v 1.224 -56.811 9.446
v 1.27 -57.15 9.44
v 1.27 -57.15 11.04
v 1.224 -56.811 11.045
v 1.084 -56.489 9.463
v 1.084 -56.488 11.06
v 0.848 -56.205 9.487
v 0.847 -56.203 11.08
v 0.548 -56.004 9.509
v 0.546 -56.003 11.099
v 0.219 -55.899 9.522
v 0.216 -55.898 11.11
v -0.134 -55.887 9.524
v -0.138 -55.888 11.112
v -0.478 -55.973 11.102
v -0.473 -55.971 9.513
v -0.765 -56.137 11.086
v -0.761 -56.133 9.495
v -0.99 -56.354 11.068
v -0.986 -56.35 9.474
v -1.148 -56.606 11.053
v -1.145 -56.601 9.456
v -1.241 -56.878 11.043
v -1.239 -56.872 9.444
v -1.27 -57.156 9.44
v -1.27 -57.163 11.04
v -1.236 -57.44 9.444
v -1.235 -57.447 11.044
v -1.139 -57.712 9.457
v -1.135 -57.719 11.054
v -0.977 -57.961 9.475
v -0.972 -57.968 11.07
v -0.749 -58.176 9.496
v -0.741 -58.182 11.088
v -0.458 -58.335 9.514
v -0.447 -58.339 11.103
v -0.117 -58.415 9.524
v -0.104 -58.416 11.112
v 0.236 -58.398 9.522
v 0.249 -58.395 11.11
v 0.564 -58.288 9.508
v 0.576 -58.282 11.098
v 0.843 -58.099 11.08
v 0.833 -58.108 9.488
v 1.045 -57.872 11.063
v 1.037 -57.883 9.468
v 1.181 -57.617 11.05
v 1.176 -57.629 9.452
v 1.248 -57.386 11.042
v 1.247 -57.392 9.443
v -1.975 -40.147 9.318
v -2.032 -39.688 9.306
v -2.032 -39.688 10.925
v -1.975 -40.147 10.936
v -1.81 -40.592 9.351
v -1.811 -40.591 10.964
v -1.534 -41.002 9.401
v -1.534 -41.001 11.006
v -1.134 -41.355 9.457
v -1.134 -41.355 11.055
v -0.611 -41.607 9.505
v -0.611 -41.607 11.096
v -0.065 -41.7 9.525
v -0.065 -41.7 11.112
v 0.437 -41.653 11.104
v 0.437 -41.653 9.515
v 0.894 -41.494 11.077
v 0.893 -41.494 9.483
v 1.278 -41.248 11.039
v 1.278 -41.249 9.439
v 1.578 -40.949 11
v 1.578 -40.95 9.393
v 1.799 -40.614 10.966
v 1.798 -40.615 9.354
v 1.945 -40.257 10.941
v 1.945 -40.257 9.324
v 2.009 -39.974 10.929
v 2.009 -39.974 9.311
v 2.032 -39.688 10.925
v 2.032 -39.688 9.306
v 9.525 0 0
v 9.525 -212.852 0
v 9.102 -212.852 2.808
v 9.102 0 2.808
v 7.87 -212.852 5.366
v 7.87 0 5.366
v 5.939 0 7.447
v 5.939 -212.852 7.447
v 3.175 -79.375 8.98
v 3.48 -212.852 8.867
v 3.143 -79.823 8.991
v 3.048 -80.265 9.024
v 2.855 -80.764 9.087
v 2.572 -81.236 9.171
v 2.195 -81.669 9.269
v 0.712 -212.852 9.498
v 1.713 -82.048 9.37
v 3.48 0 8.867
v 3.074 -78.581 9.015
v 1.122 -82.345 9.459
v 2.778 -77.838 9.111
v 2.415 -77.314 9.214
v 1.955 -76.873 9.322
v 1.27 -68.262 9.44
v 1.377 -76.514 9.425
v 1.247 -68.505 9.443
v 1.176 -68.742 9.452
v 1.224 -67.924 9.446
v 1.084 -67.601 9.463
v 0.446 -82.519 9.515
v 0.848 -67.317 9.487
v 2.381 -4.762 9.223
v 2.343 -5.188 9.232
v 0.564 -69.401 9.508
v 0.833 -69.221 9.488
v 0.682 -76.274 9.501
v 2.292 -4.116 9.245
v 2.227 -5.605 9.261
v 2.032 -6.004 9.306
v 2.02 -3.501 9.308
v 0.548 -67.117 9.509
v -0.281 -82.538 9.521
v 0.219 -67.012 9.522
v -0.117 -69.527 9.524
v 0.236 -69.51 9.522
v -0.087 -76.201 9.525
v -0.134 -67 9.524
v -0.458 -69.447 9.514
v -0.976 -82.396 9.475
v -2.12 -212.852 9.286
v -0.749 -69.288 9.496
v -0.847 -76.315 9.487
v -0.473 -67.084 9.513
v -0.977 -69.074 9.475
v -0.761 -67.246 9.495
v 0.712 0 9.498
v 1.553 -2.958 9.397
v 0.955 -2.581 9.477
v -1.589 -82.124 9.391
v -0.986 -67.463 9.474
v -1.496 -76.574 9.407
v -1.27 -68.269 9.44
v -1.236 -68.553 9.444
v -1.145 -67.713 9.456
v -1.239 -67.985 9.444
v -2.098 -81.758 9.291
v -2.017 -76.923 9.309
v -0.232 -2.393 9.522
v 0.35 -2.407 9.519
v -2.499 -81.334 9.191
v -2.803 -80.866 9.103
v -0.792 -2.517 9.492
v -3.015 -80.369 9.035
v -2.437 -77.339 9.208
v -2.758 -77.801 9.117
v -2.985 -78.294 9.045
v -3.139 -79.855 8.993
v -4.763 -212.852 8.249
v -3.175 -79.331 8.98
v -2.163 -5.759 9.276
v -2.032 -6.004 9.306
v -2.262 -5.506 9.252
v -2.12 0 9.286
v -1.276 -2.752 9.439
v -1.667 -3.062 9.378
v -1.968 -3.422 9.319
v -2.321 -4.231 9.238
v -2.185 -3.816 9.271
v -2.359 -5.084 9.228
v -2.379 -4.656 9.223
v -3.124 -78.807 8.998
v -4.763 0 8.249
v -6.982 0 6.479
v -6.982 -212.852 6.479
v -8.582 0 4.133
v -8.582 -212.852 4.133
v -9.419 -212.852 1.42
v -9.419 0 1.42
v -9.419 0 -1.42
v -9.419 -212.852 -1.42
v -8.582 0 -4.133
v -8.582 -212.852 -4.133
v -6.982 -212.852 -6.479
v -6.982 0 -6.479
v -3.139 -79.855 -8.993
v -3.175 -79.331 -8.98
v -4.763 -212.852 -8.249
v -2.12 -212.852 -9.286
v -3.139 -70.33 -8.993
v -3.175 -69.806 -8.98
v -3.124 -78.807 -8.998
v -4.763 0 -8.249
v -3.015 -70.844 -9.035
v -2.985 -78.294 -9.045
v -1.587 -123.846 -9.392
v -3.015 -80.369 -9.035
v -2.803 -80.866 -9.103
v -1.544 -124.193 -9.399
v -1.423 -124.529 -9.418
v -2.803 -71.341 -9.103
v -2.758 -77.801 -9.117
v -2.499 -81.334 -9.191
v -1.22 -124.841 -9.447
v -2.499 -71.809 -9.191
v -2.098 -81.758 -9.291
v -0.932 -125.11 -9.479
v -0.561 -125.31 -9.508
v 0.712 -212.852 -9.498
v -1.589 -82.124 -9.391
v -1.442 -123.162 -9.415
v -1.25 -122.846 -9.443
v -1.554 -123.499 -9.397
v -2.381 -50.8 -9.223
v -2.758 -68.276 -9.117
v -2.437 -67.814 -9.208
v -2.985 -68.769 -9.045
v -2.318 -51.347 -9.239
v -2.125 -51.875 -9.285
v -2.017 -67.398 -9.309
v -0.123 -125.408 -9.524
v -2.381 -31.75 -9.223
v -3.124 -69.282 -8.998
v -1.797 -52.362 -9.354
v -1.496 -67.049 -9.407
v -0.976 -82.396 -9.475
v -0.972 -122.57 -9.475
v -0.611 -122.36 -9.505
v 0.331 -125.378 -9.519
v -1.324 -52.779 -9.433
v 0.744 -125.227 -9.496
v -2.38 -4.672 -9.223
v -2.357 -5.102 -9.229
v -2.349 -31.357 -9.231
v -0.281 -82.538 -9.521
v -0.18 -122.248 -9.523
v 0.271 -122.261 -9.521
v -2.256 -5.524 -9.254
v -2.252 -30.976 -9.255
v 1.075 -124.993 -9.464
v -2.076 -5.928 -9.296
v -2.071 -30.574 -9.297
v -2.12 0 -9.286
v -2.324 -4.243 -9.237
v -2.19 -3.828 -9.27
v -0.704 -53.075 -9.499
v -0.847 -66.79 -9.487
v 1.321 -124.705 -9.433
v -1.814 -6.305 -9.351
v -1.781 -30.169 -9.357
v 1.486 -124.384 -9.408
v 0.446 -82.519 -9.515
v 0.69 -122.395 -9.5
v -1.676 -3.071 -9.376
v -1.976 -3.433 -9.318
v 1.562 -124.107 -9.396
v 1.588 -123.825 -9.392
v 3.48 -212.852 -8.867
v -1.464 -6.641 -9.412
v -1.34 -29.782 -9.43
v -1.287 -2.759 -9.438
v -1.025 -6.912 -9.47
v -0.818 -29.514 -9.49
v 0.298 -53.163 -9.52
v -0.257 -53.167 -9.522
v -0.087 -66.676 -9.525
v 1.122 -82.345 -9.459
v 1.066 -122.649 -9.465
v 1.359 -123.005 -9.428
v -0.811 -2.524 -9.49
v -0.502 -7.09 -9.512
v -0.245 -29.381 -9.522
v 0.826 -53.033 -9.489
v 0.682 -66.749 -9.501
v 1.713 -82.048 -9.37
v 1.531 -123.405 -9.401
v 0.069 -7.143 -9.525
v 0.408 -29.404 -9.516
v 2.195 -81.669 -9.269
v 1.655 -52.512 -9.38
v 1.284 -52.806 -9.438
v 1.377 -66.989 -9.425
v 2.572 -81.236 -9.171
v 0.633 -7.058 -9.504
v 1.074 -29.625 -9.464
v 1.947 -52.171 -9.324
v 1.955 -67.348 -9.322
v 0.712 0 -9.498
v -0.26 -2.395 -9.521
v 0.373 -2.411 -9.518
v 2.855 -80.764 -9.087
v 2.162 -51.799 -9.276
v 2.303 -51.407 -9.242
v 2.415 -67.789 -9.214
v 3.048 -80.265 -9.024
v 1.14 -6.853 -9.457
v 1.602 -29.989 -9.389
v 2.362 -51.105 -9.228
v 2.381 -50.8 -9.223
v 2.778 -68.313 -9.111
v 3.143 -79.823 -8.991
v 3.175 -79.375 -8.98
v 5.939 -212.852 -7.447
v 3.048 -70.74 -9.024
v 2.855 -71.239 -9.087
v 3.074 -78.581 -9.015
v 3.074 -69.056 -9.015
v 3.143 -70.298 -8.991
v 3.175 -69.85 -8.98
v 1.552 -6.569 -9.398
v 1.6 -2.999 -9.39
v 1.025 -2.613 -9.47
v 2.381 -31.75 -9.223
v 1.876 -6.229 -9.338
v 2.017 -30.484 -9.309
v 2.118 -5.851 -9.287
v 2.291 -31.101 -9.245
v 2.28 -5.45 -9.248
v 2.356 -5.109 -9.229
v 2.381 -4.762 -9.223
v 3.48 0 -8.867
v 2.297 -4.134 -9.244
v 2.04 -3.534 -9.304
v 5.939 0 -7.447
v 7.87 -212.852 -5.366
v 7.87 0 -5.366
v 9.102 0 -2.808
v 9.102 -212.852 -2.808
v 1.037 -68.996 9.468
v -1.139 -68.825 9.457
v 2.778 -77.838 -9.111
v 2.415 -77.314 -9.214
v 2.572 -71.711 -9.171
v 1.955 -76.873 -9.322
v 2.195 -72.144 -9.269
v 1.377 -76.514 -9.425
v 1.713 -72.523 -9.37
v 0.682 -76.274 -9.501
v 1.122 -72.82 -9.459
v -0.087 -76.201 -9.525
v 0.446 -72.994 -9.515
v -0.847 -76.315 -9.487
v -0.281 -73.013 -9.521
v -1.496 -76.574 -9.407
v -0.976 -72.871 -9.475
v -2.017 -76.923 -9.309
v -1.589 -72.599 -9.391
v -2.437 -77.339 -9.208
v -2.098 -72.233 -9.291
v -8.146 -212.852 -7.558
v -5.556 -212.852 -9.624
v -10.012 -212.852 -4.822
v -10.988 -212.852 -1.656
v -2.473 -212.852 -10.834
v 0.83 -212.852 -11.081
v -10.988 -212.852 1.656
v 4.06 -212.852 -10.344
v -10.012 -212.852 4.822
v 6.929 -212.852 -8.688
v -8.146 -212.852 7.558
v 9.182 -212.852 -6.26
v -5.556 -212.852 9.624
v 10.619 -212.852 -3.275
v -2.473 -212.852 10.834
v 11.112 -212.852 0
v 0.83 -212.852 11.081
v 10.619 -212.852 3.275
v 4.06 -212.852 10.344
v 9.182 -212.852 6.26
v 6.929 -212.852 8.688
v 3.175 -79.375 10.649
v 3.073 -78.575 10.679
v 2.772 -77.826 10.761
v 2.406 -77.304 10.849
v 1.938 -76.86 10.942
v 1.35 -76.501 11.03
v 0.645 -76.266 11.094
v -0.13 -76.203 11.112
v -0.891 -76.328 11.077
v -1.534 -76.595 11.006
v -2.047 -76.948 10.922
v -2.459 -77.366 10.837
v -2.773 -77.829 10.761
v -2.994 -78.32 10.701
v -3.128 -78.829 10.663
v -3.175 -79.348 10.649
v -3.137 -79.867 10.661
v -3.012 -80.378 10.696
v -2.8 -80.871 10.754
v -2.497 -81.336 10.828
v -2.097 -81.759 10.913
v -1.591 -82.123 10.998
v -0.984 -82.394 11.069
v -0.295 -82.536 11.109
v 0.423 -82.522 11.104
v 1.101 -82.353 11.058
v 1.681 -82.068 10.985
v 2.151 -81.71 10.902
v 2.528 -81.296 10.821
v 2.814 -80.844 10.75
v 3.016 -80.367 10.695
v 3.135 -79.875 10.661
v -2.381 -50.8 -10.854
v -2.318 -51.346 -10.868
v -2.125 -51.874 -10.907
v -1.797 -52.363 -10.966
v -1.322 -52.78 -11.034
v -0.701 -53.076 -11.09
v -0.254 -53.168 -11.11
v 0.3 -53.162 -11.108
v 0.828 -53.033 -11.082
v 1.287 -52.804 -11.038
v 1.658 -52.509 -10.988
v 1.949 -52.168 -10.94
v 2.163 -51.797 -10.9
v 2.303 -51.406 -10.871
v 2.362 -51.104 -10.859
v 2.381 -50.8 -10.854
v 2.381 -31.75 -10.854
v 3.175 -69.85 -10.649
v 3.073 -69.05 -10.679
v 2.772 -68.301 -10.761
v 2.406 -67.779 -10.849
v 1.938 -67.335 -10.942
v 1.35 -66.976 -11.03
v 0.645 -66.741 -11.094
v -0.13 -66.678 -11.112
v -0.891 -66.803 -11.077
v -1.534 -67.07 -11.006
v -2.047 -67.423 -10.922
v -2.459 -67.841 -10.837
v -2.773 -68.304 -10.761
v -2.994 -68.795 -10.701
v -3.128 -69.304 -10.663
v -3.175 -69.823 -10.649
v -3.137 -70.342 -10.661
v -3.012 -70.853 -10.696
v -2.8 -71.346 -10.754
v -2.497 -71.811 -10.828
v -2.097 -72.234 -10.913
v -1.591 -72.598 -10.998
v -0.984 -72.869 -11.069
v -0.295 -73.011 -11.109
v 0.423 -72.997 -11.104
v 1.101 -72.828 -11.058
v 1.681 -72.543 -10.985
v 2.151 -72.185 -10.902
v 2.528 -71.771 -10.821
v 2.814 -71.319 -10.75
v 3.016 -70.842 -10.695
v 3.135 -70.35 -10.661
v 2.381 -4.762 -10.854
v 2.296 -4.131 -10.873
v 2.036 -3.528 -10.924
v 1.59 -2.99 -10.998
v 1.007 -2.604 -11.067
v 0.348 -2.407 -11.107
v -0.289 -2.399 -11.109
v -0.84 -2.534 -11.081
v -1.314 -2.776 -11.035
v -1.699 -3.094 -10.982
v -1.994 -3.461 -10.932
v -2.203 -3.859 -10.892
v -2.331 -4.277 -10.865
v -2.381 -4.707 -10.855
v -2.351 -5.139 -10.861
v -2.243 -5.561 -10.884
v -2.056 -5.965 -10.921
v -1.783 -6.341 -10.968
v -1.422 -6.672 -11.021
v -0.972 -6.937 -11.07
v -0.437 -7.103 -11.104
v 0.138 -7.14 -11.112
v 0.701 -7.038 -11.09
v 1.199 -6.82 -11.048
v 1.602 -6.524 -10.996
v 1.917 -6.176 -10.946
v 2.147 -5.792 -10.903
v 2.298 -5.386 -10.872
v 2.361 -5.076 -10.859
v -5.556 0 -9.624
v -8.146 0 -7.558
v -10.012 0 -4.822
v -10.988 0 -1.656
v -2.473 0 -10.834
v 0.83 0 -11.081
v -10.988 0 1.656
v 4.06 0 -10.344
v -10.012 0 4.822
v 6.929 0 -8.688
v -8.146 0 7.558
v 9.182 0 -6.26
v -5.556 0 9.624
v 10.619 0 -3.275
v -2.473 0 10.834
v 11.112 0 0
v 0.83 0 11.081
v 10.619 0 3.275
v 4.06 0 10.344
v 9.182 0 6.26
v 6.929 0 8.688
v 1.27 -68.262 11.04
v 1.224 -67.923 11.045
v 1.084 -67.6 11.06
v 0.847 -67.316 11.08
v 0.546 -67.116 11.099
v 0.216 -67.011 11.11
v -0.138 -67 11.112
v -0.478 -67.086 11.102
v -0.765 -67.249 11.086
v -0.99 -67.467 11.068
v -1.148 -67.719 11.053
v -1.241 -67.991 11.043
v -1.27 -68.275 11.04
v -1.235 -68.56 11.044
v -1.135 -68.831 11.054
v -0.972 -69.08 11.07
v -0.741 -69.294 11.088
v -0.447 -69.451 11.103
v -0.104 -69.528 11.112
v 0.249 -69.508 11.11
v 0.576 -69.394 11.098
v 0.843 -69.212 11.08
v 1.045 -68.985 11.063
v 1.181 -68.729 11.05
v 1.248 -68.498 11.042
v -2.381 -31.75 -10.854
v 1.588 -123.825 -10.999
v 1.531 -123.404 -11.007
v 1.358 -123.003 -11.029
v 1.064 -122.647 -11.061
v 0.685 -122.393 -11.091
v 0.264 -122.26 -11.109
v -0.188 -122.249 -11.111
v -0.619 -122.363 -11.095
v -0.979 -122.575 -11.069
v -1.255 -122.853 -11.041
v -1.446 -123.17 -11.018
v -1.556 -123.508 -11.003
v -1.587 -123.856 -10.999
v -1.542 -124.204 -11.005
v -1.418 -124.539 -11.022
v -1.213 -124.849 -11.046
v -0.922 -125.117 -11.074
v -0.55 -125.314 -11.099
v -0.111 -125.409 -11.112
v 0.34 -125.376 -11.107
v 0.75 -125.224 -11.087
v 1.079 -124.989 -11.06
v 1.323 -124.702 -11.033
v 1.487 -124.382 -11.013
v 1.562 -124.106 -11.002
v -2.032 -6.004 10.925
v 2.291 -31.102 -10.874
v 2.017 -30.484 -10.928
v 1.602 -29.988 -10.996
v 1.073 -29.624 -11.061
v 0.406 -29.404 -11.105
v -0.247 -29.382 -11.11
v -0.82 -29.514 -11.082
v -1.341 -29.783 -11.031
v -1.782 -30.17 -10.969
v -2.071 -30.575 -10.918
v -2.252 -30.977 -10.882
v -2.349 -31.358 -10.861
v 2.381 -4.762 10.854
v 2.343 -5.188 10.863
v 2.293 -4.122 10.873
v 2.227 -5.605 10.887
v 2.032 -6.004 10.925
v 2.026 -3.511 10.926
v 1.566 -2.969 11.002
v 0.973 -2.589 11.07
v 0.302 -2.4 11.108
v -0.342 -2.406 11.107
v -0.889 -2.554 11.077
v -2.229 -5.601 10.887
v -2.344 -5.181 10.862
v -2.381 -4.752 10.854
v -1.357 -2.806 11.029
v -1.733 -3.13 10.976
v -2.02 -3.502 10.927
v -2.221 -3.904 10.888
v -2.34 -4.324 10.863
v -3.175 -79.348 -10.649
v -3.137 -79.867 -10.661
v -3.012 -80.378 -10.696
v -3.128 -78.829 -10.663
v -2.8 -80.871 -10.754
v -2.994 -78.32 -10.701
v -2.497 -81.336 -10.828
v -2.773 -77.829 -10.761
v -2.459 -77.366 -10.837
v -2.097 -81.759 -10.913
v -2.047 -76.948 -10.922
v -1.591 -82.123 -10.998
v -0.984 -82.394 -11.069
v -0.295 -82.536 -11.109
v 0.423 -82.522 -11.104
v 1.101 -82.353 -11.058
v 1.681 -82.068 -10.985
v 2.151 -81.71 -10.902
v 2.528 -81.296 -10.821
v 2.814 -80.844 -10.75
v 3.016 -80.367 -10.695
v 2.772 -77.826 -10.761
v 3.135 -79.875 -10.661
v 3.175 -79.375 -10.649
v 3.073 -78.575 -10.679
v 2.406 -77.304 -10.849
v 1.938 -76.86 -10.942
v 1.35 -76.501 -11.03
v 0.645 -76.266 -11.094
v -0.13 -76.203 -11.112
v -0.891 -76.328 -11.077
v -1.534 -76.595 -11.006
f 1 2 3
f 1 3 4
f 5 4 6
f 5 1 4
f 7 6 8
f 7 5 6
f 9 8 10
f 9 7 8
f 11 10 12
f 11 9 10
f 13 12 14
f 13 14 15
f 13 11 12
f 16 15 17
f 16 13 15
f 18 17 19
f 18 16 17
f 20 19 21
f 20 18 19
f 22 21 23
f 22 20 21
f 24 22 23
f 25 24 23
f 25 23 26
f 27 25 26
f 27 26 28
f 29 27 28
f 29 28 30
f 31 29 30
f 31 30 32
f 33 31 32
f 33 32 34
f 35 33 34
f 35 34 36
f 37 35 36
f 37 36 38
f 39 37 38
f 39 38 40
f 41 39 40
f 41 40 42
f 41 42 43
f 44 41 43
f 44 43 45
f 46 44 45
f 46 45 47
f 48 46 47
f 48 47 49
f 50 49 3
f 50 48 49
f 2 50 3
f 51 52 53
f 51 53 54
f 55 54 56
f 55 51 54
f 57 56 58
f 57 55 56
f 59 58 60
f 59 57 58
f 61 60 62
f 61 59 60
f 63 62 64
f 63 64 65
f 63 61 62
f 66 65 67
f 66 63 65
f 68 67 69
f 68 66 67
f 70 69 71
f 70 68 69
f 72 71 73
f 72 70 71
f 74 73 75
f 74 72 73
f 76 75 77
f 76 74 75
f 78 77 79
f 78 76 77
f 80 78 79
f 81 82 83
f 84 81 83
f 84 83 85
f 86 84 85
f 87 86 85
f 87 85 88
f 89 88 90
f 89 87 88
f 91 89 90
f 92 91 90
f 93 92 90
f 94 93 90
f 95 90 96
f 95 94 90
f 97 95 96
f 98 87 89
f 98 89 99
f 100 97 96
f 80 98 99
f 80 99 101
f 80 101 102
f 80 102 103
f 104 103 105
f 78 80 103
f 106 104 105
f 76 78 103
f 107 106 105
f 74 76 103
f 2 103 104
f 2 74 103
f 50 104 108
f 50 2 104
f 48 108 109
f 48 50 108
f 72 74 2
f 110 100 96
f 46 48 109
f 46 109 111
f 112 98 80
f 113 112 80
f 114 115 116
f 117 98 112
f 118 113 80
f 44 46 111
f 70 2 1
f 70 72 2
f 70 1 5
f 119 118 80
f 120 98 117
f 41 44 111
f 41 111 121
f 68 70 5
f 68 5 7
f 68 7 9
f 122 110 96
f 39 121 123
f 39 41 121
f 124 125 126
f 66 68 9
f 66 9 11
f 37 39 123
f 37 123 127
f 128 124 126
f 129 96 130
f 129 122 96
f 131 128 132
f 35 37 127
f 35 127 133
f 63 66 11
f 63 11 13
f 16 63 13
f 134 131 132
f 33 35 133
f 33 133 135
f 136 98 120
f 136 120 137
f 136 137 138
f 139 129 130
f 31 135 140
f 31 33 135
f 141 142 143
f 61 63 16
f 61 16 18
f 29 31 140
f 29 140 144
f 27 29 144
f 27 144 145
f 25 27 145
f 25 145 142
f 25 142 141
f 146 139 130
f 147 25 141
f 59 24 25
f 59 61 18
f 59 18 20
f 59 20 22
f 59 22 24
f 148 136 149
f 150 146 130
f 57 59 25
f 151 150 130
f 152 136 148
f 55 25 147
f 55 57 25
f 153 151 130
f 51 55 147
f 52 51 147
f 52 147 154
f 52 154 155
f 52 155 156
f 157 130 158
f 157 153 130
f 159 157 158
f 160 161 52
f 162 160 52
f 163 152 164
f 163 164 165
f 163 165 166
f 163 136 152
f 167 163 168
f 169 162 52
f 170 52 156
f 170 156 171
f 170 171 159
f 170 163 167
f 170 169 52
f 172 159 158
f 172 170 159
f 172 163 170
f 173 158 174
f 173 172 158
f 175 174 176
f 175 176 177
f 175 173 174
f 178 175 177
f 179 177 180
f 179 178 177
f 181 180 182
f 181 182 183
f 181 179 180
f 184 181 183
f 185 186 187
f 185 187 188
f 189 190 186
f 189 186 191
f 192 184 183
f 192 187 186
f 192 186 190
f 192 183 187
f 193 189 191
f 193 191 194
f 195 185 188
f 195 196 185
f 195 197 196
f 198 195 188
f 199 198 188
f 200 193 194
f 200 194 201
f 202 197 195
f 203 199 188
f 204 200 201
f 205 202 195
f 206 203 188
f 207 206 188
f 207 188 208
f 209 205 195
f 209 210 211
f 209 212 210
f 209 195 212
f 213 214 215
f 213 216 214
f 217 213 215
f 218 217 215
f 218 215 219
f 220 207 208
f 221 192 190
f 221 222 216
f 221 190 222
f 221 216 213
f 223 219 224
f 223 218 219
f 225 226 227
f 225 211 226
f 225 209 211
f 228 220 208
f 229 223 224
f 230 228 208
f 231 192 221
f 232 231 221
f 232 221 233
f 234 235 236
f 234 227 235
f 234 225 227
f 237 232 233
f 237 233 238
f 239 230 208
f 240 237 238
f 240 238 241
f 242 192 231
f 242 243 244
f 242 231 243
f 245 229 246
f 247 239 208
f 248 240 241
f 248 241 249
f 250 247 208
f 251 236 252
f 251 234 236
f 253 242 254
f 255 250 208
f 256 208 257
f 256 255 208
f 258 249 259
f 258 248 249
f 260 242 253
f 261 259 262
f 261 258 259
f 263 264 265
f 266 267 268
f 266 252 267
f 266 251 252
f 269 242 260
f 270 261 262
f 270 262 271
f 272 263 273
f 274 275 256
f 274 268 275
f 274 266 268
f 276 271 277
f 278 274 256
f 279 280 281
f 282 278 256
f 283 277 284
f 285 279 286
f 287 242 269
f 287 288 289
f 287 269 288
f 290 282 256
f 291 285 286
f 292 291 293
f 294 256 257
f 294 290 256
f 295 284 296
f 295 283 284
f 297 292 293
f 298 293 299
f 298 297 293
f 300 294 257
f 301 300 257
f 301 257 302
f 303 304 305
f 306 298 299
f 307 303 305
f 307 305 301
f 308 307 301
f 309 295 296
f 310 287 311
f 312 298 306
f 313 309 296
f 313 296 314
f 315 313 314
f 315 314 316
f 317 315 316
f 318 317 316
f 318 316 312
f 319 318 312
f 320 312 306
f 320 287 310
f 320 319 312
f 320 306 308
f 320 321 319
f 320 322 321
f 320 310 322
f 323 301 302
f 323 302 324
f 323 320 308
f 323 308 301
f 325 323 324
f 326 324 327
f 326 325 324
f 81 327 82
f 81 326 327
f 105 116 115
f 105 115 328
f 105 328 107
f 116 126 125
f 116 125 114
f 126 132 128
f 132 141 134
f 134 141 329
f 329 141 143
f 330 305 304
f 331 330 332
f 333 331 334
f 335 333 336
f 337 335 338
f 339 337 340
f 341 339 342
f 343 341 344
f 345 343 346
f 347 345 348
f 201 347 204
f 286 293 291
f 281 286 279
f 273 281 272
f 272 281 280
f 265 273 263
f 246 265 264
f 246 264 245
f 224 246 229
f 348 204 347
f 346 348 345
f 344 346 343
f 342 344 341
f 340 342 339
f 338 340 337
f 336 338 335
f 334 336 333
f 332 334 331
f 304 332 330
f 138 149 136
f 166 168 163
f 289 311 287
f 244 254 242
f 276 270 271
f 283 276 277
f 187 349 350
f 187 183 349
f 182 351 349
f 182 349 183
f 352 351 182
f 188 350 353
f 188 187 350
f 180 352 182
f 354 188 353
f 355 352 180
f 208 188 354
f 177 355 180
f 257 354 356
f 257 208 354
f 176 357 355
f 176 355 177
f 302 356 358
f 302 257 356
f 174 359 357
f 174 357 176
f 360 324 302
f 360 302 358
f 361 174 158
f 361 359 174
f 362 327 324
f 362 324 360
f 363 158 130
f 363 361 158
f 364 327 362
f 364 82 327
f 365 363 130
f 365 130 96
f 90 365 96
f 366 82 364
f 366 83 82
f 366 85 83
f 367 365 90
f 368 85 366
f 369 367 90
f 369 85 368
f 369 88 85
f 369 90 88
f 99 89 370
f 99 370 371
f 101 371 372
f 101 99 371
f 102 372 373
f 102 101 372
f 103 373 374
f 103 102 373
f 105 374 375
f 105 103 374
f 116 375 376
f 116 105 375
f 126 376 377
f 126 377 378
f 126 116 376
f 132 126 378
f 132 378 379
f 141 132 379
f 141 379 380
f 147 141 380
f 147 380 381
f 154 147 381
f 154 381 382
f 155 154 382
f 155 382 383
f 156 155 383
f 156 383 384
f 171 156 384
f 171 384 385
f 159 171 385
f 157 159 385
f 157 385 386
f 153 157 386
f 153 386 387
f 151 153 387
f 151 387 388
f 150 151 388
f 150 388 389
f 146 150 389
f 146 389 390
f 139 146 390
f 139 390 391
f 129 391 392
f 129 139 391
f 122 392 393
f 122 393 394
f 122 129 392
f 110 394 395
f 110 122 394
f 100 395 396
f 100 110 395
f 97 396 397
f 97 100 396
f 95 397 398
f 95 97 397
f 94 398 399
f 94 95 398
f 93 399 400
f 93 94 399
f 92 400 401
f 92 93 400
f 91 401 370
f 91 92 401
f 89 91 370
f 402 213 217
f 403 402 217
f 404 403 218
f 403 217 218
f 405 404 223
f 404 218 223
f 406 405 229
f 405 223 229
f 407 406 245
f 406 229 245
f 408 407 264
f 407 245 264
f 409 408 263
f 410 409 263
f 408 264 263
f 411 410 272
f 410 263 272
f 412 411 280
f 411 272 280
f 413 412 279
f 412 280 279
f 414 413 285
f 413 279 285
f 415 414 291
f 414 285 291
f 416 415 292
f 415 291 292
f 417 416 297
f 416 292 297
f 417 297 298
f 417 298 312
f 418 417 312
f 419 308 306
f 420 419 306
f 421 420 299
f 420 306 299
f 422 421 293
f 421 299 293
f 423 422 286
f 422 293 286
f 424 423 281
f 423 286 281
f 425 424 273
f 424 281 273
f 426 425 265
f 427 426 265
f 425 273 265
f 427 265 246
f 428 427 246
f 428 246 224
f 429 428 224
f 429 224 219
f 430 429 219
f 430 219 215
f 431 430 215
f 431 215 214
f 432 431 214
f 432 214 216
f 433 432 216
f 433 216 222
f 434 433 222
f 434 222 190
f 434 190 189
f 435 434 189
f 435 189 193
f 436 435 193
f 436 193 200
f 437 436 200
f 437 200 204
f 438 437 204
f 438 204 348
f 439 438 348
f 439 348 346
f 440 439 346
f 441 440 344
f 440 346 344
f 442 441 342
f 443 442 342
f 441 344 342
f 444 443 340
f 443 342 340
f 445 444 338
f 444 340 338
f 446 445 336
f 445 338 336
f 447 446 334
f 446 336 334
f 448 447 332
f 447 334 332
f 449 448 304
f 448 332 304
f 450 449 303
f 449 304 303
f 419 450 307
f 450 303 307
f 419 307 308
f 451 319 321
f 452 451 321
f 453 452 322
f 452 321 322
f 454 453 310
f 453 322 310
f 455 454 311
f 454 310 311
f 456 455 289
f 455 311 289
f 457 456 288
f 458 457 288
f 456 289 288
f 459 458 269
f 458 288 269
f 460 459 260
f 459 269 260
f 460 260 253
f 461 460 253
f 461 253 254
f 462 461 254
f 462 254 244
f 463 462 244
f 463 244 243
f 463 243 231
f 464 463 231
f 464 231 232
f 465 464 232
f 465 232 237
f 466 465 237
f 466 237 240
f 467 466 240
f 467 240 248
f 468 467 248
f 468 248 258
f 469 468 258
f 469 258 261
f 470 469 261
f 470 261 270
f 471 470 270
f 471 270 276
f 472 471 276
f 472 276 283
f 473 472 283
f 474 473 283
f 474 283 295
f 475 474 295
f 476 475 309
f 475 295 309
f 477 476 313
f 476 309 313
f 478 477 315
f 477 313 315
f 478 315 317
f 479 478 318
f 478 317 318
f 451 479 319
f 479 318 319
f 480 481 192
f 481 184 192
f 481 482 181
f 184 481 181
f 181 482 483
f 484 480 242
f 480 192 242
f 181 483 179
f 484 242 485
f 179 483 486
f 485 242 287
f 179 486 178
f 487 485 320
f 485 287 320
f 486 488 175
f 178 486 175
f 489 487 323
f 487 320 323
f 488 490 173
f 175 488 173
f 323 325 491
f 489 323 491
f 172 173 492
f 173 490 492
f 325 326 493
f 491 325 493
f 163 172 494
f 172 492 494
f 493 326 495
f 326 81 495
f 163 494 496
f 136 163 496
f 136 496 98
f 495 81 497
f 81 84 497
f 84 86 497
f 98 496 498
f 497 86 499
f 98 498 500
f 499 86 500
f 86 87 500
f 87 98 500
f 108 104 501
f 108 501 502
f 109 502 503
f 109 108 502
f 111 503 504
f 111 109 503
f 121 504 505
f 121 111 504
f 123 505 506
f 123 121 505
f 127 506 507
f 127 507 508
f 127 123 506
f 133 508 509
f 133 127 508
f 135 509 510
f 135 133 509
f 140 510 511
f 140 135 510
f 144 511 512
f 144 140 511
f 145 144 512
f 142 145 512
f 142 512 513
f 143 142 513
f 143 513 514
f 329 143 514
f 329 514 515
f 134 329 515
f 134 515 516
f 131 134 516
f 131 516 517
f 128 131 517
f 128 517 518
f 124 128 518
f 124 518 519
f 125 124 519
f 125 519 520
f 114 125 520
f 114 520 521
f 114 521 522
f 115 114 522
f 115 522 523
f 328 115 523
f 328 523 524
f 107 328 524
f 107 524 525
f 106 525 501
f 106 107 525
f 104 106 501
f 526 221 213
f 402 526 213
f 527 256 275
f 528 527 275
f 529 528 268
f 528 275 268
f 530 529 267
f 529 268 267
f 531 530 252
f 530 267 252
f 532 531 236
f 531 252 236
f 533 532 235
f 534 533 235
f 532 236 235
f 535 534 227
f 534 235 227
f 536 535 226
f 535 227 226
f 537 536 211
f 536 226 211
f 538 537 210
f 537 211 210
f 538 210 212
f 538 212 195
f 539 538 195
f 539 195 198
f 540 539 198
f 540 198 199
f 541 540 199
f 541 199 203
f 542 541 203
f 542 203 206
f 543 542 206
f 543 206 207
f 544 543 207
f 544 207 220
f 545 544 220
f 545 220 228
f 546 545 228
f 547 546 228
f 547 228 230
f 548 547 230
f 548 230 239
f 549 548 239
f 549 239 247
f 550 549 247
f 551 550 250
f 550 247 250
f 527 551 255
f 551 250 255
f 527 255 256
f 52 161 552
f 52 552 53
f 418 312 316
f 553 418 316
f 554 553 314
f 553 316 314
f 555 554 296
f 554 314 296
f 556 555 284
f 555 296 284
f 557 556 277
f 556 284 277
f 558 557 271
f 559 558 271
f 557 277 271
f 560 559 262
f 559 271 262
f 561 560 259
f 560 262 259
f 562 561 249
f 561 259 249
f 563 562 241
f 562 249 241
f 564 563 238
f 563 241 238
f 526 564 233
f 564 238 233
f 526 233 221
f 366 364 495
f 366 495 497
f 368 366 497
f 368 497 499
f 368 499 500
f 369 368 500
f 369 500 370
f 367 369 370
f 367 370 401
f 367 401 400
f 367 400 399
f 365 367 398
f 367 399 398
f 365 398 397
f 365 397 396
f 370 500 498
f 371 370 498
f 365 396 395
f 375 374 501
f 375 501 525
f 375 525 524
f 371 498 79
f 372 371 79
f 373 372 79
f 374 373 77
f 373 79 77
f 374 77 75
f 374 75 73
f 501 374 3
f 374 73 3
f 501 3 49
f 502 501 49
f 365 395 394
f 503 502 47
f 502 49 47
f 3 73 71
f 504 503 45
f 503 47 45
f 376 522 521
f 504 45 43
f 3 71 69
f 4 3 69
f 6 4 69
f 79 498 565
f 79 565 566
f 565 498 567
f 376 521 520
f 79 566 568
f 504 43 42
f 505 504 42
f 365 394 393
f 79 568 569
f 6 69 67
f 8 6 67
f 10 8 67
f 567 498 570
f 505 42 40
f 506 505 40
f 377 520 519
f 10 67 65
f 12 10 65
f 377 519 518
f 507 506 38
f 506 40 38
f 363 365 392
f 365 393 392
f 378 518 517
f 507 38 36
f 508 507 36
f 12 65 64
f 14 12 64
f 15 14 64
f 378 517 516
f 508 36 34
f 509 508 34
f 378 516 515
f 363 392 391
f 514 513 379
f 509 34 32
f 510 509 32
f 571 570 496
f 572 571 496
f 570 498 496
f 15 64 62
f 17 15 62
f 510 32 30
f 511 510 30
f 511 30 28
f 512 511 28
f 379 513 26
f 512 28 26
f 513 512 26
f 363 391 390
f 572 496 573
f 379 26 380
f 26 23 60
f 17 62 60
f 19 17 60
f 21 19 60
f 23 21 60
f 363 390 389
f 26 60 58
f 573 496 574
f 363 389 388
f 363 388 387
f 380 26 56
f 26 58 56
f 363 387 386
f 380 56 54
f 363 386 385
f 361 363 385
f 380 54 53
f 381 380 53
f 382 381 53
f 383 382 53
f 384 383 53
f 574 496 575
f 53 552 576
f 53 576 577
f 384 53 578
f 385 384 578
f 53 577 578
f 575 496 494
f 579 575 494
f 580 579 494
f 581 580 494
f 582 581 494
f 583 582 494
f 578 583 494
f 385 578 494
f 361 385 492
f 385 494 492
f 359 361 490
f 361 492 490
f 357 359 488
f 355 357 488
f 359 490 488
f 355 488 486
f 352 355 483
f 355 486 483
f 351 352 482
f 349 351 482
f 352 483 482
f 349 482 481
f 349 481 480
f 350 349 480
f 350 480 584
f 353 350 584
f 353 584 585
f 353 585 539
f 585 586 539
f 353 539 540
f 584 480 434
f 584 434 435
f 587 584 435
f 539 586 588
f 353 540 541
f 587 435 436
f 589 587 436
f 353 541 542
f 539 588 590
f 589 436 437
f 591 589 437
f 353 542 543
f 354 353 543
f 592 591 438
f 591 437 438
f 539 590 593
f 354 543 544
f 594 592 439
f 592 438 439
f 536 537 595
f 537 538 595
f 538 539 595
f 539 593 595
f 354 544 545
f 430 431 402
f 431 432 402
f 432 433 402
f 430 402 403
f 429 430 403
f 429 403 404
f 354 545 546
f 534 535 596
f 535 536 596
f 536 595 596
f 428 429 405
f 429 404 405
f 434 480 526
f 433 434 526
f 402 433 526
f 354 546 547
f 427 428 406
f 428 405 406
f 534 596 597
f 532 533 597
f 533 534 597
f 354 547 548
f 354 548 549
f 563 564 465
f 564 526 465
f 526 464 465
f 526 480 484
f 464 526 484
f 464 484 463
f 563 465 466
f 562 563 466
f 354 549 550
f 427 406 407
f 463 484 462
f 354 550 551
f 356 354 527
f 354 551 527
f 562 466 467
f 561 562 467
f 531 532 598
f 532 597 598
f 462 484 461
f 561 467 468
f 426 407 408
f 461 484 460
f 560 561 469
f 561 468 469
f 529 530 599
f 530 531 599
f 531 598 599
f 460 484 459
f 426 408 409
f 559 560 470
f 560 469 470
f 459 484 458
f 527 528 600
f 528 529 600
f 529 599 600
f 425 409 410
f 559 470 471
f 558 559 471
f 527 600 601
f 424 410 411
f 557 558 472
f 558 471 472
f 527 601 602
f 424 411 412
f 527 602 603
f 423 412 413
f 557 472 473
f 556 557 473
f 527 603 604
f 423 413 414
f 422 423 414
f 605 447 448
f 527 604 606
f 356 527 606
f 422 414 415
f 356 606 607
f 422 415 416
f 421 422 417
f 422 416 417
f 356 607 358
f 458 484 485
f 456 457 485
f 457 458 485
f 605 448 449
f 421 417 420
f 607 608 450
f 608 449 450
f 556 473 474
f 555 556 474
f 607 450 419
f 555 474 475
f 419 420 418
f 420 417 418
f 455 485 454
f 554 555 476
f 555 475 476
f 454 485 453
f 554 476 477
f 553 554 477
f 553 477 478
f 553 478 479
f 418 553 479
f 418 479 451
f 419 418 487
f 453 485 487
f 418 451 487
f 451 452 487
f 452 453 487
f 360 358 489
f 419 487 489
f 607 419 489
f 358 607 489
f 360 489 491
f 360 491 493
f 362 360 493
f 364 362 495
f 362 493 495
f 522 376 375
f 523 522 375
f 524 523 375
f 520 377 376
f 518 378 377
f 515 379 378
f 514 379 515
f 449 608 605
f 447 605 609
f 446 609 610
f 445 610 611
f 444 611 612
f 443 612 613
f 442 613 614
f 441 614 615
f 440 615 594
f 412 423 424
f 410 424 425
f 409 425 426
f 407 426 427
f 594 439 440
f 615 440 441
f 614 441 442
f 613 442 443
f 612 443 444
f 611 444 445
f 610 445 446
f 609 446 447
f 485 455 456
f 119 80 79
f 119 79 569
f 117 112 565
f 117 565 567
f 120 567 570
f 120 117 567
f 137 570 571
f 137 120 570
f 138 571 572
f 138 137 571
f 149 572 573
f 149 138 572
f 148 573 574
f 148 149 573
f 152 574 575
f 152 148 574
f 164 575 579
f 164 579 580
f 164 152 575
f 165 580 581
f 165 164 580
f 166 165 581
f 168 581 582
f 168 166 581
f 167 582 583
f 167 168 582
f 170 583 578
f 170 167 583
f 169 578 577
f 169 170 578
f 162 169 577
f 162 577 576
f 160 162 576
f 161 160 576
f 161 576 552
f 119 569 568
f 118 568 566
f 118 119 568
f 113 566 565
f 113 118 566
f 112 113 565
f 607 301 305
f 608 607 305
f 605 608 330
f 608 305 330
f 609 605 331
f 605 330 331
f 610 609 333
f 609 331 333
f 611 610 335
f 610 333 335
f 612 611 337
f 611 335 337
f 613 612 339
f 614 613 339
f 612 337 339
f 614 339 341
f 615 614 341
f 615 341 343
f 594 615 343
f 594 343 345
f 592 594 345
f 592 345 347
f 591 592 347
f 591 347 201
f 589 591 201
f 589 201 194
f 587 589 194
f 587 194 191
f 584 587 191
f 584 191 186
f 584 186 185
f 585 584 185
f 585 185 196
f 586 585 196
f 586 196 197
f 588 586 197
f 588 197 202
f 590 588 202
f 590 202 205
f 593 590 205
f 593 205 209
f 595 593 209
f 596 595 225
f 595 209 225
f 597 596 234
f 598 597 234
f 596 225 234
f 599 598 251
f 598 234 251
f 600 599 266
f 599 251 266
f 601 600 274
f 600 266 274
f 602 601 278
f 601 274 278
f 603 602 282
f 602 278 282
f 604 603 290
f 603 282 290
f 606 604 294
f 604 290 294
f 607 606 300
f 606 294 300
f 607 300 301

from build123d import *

# Parameters (mm, degrees)
F0_R     = 11.1125
F0_R_2   = 9.525
F1_DEPTH = 212.852
F2_R     = 2.38125
F2_R_2   = 3.175
F2_R_3   = 1.5875
F3_DEPTH = 25.4
F4_R     = 1.27
F4_R_2   = 3.175
F5_DEPTH = 25.4


with BuildPart() as f1:
    # F0 (on Front) → F1 (new body)
    with BuildSketch(Plane.XZ):
        Circle(F0_R)
        Circle(F0_R_2, mode=Mode.SUBTRACT)
    extrude(amount=F1_DEPTH)

    # F2 (on Top) → F3 (cut)
    with BuildSketch(Plane.XY):
        with Locations((0, -4.7625)):
            Circle(F2_R)
        with BuildLine():
            ThreePointArc((-2.38125, -50.8), (0, -53.18125), (2.38125, -50.8))
            Line((2.38125, -50.8), (2.38125, -31.75))
            ThreePointArc((2.38125, -31.75), (0, -29.36875), (-2.38125, -31.75))
            Line((-2.38125, -31.75), (-2.38125, -50.8))
        make_face()
        with Locations((0, -69.85)):
            Circle(F2_R_2)
        with Locations((0, -79.375)):
            Circle(F2_R_2)
        with Locations((0, -123.825)):
            Circle(F2_R_3)
    extrude(amount=-F3_DEPTH, mode=Mode.SUBTRACT)

    # F4 (on Top) → F5 (cut)
    with BuildSketch(Plane.XY):
        with BuildLine():
            ThreePointArc((2.032, -6.004002), (2.292275, -5.407346), (2.38125, -4.7625))
            ThreePointArc((2.38125, -4.7625), (-0.644846, -2.470225), (-2.032, -6.004002))
            ThreePointArc((-2.032, -6.004002), (0, -7.14375), (2.032, -6.004002))
        make_face()
        with BuildLine():
            ThreePointArc((2.032, -6.004002), (0, -7.14375), (-2.032, -6.004002))
            Line((-2.032, -6.004002), (-2.032, -39.6875))
            Line((-2.032, -39.6875), (0, -39.6875))
            Line((0, -39.6875), (2.032, -39.6875))
            Line((2.032, -39.6875), (2.032, -6.004002))
        make_face()
        with BuildLine():
            Line((0, -39.6875), (-2.032, -39.6875))
            ThreePointArc((-2.032, -39.6875), (0, -41.700798), (2.032, -39.6875))
            Line((2.032, -39.6875), (0, -39.6875))
        make_face()
        with Locations((0, -57.15)):
            Circle(F4_R)
        with Locations((0, -68.2625)):
            Circle(F4_R)
        with Locations((0, -79.375)):
            Circle(F4_R_2)
    extrude(amount=F5_DEPTH, mode=Mode.SUBTRACT)


solid = f1.part
